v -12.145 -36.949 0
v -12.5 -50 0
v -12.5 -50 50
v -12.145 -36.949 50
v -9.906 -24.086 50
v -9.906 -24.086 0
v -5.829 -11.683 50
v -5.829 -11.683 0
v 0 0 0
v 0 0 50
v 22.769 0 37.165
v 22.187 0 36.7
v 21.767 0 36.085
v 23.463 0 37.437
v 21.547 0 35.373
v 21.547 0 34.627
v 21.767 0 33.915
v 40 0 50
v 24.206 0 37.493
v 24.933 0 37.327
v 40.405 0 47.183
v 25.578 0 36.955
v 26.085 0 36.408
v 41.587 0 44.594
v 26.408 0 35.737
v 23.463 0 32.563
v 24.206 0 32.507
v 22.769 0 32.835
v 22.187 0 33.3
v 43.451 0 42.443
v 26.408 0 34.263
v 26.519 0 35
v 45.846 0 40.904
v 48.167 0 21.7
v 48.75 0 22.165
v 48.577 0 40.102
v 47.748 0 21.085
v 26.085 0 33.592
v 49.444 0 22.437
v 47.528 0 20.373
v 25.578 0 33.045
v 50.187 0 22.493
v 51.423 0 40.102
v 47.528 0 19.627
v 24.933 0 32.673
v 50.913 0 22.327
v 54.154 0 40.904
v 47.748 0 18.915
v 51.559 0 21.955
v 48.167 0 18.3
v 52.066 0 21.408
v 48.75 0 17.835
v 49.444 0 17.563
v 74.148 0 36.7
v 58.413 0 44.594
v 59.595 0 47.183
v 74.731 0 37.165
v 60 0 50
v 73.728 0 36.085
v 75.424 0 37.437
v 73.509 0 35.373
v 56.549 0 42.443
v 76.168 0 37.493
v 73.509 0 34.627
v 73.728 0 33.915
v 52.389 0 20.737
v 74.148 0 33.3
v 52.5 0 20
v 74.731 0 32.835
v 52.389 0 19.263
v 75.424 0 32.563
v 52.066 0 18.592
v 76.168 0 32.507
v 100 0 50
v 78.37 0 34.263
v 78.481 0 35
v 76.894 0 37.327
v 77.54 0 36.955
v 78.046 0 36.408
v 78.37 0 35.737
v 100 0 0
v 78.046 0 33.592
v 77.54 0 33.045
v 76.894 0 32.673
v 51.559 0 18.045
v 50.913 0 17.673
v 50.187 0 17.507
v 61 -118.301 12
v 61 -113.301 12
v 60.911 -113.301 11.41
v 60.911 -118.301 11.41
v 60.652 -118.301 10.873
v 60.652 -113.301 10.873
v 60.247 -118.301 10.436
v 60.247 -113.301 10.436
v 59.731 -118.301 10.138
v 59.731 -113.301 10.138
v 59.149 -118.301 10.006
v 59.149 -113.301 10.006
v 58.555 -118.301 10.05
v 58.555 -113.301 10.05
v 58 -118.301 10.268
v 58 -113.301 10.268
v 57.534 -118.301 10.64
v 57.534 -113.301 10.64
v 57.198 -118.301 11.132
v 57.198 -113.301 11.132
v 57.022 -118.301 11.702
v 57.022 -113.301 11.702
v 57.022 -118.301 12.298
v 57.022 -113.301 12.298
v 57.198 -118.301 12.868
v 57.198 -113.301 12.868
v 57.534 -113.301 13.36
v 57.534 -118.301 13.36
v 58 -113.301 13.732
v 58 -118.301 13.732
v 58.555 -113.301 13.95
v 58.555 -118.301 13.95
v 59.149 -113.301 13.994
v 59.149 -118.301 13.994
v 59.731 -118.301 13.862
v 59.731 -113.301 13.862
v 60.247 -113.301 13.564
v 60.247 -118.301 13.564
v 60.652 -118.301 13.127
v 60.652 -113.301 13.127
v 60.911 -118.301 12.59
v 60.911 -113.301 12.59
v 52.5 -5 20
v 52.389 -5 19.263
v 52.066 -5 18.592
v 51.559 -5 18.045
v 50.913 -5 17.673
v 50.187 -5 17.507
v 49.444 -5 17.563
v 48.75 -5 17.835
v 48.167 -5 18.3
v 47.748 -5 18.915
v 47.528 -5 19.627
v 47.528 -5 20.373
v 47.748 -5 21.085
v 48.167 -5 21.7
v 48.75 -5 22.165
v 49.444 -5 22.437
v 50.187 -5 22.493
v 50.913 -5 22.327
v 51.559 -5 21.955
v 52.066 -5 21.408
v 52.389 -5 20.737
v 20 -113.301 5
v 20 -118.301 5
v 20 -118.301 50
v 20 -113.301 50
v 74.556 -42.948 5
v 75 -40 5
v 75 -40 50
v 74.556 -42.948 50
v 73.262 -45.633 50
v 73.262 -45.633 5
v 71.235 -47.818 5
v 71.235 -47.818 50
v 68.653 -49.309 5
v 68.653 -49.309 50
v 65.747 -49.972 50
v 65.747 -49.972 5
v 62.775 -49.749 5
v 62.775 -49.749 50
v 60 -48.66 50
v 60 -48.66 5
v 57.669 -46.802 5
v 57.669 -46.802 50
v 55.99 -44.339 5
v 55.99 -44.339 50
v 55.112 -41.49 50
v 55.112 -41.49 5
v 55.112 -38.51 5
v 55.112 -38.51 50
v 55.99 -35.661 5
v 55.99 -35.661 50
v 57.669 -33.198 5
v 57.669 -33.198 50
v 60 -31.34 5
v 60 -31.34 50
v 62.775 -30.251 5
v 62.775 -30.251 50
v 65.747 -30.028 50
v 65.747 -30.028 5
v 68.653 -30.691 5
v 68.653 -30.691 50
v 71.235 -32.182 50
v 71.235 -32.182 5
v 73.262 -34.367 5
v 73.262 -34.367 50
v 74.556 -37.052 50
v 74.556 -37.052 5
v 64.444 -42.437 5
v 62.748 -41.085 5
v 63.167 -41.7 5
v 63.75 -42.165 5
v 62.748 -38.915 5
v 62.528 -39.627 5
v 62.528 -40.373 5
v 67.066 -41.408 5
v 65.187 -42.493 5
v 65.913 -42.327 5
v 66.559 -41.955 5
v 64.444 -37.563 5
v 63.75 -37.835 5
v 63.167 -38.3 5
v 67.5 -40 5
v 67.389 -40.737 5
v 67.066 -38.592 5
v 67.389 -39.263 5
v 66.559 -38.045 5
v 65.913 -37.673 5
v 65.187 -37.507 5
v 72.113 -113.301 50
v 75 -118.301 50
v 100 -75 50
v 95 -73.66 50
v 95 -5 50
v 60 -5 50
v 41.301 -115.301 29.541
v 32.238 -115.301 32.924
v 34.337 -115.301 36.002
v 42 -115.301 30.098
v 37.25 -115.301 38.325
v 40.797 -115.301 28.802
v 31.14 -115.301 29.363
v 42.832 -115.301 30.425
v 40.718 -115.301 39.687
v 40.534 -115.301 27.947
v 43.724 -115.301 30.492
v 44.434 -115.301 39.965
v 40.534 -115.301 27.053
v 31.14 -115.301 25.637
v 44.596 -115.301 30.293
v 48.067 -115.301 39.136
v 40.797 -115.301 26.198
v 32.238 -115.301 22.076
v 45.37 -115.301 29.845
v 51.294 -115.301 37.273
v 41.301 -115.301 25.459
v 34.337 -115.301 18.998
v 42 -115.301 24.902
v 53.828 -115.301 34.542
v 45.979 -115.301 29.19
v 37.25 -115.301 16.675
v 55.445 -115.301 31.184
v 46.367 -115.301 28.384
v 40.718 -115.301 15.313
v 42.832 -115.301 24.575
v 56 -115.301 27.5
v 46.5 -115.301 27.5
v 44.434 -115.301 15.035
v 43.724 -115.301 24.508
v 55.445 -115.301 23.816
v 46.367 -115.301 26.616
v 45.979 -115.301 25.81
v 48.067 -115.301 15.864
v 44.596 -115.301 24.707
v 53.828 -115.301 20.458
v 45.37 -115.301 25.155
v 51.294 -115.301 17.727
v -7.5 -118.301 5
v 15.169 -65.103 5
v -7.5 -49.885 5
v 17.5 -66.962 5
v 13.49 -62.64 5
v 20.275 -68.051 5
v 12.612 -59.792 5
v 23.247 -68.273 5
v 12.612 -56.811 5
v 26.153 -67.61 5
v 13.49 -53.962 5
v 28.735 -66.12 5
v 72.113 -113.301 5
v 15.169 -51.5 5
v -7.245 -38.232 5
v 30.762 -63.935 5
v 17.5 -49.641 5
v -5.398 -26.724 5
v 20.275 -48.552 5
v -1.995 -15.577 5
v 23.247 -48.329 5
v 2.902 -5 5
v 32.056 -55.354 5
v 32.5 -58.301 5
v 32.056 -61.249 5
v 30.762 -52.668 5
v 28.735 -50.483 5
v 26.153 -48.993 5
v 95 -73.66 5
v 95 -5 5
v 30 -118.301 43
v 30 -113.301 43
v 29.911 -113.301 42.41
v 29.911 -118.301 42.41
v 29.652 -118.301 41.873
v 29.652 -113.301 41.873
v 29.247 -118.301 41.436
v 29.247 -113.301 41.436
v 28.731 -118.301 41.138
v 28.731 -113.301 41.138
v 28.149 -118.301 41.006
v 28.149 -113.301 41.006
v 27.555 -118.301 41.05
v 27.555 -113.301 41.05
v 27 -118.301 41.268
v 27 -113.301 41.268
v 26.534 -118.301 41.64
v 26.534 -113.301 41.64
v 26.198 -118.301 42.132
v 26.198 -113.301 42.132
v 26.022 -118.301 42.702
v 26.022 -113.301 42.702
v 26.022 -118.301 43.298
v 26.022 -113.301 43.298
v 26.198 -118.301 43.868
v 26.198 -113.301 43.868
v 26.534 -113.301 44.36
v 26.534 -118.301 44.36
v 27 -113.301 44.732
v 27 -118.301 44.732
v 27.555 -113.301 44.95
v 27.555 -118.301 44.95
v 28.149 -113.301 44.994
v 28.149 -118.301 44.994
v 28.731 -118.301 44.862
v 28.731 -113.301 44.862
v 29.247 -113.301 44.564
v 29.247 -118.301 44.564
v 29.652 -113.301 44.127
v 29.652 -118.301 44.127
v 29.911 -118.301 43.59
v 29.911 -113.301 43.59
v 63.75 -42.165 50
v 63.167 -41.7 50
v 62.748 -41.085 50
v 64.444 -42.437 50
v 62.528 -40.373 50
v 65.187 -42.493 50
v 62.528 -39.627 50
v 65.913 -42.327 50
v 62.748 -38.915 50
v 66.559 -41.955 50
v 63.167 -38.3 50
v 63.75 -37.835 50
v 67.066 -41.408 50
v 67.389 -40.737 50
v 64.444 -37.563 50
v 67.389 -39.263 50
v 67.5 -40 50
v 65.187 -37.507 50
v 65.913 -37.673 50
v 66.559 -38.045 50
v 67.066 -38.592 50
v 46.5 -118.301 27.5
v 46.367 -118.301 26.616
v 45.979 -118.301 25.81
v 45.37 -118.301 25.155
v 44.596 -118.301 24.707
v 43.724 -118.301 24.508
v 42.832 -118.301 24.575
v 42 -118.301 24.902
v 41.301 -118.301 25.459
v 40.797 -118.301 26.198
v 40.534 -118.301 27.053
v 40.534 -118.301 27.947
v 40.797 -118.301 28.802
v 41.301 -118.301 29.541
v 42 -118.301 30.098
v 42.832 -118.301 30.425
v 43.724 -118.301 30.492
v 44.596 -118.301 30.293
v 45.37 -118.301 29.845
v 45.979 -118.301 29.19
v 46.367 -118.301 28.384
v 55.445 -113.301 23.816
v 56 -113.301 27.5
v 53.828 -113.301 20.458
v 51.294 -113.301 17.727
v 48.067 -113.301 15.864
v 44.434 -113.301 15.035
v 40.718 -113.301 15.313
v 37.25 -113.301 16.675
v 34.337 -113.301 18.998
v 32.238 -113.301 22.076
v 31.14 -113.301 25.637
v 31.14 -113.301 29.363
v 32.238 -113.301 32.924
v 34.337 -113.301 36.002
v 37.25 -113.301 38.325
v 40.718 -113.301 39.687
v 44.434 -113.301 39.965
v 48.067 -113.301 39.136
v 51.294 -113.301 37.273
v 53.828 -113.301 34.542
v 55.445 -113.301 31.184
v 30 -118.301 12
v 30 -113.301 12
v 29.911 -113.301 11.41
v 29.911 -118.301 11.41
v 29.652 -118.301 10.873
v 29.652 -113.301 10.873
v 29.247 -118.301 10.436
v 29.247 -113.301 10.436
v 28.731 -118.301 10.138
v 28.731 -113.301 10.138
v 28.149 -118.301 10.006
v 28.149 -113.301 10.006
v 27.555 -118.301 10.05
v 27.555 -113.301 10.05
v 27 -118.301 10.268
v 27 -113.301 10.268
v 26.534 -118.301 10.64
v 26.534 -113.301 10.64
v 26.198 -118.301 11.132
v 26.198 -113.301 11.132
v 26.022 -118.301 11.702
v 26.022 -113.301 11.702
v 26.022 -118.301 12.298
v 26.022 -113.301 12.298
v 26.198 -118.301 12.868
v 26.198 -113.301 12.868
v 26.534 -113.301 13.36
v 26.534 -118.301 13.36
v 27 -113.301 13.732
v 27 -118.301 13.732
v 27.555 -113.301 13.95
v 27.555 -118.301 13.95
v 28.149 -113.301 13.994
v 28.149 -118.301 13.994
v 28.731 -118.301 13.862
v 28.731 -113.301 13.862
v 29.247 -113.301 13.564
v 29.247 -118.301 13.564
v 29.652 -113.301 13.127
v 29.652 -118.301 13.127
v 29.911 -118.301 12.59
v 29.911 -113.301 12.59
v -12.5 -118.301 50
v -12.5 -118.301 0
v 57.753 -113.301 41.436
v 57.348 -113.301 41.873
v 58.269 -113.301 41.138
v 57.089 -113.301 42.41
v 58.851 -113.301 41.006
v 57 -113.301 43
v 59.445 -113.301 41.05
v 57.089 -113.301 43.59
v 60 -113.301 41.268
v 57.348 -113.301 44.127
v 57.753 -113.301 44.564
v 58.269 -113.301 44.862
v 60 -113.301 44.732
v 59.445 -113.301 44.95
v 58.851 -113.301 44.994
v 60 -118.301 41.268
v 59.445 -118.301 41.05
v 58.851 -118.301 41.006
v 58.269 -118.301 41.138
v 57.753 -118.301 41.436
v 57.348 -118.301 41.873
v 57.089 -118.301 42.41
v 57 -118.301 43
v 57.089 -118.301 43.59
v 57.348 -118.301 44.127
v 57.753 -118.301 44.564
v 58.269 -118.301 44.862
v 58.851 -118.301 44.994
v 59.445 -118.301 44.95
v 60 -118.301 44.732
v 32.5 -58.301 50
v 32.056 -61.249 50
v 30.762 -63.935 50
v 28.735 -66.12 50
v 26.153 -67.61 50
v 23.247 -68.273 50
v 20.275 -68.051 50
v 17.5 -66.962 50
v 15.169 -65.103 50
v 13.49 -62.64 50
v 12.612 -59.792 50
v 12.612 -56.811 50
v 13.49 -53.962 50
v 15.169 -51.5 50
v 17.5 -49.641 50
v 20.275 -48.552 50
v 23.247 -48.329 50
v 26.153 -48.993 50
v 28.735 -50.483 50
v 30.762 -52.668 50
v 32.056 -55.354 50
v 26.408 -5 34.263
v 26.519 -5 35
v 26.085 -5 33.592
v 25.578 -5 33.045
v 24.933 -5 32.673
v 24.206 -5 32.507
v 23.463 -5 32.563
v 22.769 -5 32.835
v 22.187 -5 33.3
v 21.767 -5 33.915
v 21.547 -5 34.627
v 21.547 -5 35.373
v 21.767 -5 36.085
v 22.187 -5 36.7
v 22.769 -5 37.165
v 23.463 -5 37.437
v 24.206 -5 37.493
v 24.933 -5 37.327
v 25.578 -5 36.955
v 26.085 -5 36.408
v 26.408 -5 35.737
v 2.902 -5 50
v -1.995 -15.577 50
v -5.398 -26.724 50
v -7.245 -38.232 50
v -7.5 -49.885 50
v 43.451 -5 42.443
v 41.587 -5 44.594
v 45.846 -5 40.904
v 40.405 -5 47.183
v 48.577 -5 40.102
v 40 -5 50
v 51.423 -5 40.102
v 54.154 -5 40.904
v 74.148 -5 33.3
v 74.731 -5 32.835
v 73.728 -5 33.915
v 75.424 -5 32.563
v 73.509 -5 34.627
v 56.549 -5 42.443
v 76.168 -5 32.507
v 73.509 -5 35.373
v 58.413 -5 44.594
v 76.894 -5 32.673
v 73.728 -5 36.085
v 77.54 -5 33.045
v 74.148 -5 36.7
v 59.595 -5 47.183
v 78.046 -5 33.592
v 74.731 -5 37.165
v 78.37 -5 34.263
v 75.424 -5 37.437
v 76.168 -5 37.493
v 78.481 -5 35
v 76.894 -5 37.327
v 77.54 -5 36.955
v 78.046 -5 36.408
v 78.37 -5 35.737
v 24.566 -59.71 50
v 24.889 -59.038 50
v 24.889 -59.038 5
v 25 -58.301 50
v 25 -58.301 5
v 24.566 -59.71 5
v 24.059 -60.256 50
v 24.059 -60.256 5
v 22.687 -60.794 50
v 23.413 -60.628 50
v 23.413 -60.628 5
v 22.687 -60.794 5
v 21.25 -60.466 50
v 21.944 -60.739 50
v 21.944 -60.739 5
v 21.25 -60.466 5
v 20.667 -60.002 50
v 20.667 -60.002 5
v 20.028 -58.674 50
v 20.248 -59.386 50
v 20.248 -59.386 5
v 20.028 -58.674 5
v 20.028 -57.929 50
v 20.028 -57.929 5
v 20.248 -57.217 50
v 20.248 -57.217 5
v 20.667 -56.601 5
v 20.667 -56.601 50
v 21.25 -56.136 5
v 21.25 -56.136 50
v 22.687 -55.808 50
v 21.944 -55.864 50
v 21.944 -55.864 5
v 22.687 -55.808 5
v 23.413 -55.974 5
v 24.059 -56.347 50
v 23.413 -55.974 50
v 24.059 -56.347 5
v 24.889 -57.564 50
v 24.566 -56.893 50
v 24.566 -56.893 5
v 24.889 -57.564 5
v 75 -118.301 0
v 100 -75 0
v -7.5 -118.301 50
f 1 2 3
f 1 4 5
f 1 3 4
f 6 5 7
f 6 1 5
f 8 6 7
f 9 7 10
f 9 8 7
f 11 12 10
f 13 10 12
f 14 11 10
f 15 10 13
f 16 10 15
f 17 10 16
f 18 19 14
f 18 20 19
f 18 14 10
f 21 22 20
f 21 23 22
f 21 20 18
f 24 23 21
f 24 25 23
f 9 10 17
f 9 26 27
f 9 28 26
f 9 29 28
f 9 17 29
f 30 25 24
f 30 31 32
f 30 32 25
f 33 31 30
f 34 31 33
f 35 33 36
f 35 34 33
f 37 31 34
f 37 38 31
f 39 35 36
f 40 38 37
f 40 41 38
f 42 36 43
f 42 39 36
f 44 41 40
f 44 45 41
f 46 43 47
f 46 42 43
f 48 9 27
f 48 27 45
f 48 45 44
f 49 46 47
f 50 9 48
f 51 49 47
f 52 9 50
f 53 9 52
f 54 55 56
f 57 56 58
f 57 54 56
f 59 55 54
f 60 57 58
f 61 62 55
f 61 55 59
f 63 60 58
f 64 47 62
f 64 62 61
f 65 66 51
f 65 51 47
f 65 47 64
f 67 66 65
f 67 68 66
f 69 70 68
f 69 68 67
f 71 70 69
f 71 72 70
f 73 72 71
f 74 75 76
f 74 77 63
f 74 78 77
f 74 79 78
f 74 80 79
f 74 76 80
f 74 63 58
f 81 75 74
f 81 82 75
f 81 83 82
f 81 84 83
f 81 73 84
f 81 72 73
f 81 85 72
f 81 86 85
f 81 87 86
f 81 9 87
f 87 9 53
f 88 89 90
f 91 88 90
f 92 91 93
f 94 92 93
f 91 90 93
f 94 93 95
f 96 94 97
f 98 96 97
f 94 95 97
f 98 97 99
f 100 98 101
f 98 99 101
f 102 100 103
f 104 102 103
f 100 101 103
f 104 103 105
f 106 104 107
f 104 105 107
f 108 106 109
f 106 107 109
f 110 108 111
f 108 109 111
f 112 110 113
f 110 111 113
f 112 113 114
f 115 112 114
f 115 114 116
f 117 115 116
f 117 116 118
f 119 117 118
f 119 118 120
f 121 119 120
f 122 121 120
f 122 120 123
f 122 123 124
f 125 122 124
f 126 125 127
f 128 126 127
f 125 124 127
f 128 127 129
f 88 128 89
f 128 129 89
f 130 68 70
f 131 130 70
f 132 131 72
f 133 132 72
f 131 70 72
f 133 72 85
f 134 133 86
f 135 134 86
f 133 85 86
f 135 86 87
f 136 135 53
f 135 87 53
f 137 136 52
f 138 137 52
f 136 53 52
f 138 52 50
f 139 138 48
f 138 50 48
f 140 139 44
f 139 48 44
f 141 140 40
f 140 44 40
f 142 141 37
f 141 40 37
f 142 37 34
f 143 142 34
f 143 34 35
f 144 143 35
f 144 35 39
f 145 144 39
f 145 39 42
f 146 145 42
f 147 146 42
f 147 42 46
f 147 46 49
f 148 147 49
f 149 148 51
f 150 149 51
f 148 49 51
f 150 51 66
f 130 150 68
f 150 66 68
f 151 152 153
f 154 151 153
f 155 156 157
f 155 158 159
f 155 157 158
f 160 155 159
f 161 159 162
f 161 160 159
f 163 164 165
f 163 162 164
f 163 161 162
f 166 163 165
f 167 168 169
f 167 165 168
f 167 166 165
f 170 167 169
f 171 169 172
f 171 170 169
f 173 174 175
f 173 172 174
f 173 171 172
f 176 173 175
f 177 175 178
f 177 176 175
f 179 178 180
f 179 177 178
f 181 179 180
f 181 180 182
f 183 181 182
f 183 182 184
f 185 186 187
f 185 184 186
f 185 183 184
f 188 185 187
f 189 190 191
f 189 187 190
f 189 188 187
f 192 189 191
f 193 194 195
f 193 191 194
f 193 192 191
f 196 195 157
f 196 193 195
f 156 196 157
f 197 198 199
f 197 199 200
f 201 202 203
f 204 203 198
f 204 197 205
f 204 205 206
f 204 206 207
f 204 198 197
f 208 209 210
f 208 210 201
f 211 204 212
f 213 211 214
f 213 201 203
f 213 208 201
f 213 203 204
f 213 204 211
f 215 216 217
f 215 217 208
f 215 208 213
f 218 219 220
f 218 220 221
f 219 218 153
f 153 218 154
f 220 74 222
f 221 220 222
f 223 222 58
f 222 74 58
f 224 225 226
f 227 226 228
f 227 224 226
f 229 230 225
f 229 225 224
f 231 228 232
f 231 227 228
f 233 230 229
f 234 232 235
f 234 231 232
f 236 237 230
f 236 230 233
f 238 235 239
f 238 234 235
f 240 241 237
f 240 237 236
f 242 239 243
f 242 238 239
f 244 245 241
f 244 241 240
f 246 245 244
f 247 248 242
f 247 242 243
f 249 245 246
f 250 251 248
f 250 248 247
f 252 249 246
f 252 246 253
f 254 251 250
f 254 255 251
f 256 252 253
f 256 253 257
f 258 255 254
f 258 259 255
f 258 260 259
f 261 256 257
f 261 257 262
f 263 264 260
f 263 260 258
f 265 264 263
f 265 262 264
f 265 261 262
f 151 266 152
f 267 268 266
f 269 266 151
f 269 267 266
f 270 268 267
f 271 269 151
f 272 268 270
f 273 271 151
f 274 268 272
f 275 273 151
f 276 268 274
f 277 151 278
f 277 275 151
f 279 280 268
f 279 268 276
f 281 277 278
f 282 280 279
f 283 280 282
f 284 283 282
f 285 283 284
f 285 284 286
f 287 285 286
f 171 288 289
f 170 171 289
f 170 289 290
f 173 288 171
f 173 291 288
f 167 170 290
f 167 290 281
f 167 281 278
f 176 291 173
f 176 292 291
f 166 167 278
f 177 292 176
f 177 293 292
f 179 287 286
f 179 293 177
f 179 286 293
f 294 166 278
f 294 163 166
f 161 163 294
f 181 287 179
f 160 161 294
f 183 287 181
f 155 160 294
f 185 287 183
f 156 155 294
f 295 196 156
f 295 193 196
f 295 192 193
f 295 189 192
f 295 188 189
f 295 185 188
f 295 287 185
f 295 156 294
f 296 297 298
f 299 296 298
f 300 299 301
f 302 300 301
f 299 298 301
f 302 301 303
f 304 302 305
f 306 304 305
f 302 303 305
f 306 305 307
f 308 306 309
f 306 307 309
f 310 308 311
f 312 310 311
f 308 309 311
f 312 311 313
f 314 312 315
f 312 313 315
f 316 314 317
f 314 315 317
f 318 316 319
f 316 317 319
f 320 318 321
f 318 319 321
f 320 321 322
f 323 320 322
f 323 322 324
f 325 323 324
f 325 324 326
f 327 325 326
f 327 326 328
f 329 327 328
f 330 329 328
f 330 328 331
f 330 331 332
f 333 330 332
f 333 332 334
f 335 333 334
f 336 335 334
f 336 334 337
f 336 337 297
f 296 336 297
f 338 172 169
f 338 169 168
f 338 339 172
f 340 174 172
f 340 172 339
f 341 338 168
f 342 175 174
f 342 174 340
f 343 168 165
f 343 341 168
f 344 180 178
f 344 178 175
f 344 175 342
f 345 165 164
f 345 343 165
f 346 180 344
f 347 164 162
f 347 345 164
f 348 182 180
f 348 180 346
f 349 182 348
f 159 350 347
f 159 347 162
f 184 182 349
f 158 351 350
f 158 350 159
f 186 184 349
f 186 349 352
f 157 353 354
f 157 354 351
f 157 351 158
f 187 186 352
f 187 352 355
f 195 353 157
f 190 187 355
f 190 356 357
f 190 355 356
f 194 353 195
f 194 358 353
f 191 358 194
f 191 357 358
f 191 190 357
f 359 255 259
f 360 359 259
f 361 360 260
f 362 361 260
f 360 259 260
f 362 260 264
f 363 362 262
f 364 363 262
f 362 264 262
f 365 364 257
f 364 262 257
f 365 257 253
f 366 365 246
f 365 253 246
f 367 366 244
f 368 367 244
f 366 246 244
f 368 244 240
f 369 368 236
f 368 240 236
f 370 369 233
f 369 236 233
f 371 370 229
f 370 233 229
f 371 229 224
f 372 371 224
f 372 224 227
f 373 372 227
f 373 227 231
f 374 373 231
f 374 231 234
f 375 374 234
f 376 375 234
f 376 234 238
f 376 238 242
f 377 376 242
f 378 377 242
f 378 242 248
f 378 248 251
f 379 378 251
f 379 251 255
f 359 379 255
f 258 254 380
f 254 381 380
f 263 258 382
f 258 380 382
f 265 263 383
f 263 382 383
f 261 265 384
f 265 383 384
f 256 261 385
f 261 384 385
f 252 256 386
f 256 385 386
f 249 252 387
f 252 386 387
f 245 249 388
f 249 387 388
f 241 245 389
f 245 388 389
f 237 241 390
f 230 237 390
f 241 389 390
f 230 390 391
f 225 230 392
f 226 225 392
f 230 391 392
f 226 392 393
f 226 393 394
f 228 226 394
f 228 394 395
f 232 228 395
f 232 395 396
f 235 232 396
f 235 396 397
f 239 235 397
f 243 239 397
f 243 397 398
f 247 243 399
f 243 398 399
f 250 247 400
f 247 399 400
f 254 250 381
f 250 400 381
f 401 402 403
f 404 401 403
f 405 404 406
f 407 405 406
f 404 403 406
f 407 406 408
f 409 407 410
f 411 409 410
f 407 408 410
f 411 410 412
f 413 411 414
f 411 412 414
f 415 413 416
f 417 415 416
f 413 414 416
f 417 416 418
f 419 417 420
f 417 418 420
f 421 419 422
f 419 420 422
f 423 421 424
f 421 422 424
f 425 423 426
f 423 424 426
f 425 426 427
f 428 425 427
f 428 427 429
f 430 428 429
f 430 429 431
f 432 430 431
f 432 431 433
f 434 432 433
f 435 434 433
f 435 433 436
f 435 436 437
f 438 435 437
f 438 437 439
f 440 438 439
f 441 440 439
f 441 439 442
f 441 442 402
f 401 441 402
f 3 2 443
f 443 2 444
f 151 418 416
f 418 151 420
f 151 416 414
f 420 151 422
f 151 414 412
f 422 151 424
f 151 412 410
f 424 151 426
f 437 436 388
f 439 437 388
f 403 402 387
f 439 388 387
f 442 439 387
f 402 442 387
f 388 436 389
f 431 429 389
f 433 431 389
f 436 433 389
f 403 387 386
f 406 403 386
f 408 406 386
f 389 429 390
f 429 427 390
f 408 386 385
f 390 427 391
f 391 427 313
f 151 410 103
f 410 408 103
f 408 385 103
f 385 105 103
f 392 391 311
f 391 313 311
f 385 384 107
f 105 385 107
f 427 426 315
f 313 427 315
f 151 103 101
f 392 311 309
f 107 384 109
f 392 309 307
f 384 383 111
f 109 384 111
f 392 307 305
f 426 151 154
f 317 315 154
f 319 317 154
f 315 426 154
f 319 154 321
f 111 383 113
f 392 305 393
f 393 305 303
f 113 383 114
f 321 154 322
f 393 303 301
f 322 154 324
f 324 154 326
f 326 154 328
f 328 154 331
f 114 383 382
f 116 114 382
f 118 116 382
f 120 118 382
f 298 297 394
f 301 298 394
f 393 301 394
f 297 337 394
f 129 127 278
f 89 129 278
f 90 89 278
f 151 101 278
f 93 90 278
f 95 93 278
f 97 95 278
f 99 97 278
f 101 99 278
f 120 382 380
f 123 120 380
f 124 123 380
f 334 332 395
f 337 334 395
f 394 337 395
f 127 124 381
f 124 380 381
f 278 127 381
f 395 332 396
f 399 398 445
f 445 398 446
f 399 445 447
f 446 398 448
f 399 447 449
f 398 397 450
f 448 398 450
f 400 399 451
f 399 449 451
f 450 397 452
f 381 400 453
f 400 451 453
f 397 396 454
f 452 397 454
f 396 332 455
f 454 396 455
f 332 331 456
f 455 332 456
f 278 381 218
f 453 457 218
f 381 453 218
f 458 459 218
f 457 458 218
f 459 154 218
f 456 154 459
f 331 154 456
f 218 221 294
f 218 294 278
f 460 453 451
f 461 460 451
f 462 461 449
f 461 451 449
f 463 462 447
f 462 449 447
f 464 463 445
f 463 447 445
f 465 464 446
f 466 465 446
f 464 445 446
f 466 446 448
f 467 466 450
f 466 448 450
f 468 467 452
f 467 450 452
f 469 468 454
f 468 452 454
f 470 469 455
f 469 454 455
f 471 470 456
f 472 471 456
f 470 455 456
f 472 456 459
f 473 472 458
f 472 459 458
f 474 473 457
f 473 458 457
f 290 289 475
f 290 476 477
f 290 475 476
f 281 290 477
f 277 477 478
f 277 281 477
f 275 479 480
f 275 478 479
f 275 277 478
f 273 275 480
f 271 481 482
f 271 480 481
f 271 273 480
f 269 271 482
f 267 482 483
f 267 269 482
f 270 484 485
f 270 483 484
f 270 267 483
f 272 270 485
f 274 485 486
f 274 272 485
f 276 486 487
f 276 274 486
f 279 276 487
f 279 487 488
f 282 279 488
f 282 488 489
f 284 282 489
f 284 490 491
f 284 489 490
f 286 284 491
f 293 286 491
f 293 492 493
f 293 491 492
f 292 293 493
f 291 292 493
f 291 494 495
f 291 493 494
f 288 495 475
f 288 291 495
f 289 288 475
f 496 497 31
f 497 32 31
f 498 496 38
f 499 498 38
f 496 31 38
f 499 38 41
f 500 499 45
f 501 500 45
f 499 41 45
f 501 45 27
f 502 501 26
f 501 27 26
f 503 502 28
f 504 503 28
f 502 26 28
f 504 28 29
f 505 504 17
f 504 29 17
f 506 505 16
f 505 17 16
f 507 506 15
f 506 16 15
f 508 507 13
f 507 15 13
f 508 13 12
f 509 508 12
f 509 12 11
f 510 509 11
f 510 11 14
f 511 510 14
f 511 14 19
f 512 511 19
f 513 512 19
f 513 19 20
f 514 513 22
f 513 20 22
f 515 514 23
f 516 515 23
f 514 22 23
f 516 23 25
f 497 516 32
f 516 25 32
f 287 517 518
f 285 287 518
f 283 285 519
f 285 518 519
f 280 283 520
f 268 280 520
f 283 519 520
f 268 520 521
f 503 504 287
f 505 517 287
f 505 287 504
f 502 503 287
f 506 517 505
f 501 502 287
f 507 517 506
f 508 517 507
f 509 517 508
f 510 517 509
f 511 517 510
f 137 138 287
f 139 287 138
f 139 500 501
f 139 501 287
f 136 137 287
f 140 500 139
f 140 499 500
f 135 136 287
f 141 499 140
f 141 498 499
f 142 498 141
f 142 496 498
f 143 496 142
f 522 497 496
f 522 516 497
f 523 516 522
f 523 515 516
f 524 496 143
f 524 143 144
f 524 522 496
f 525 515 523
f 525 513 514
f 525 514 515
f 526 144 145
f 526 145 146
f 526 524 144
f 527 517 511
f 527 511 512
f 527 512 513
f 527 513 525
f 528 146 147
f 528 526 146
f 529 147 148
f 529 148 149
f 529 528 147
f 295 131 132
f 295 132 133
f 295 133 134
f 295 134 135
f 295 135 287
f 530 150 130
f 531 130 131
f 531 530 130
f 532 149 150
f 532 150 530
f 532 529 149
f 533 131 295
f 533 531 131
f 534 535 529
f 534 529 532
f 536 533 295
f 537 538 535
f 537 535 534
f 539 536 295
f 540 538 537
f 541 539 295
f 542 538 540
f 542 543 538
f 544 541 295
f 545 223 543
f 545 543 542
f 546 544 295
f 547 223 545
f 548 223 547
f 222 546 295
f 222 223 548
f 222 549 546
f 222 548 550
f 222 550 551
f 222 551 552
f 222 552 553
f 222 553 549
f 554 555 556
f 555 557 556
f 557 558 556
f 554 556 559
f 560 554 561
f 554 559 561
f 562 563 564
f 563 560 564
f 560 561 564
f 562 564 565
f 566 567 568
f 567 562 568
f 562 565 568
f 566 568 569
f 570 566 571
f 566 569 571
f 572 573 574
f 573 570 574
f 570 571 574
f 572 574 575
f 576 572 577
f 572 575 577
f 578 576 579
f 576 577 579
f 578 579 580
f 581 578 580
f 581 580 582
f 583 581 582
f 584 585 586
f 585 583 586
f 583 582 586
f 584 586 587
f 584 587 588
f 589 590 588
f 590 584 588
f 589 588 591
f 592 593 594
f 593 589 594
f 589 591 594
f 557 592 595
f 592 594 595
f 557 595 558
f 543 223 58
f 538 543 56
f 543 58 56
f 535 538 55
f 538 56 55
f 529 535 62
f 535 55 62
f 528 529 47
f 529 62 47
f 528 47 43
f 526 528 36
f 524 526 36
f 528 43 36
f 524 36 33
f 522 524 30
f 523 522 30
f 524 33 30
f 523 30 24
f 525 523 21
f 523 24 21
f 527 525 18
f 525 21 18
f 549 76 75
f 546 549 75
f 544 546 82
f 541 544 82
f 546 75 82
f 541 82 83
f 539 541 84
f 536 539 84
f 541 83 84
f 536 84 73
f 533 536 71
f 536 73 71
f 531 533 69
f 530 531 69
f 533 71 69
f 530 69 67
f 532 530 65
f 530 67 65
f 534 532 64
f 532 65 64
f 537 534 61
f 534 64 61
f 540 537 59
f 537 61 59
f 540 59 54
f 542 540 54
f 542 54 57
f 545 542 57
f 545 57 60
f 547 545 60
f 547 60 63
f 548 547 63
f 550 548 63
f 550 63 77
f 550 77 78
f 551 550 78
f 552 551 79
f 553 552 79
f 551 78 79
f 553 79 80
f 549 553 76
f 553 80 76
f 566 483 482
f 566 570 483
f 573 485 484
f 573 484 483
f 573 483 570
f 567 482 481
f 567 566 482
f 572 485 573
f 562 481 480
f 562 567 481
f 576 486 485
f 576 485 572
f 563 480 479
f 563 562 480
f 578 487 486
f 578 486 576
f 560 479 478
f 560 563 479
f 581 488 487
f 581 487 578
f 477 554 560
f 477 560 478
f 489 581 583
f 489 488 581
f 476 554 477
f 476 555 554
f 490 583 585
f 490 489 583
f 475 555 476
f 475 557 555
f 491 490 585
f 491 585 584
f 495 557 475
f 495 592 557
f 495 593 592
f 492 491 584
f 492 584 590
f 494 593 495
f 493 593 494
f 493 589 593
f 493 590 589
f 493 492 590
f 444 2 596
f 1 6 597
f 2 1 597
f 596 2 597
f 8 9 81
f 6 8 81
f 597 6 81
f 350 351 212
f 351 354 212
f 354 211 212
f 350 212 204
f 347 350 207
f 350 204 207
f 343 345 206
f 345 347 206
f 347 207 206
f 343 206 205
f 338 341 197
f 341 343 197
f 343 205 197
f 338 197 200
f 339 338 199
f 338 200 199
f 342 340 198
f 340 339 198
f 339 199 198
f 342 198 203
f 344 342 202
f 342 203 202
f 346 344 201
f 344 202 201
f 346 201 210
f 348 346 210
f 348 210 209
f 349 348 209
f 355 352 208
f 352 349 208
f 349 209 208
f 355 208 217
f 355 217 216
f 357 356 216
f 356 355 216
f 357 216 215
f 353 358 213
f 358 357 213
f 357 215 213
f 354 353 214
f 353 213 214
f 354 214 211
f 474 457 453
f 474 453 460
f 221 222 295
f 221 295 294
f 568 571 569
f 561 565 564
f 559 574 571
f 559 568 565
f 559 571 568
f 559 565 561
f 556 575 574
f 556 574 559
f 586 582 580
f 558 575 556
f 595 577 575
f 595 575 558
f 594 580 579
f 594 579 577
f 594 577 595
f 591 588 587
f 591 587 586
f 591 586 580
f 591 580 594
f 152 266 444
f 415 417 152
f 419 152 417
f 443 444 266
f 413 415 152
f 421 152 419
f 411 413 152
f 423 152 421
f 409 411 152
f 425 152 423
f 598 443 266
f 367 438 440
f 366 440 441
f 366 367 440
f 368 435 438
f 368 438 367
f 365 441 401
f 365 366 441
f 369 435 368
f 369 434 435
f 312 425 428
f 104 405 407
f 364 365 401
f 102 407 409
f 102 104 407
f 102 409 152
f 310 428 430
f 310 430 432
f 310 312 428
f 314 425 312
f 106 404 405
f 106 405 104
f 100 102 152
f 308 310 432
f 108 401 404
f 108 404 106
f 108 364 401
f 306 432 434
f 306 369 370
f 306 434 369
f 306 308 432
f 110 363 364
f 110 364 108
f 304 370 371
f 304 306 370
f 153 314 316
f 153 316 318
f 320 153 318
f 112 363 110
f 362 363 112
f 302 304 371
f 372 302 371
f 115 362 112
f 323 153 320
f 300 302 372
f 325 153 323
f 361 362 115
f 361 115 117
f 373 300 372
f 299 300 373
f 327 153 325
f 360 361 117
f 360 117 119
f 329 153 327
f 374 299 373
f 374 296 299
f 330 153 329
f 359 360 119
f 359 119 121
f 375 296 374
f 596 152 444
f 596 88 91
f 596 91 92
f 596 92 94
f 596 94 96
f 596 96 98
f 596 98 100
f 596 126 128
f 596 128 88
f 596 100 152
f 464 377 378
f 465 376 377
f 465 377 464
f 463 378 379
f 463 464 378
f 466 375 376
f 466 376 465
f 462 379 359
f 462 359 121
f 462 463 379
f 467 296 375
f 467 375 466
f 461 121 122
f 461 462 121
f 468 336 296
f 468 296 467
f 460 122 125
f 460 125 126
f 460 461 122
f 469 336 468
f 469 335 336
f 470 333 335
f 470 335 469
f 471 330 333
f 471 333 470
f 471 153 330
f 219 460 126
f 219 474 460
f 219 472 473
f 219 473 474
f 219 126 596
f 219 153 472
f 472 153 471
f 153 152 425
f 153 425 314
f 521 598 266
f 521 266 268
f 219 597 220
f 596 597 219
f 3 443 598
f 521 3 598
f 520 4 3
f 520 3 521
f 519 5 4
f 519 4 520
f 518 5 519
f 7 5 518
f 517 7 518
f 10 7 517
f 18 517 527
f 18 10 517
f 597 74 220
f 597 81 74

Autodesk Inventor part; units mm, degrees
ref_plane "YZ Plane" through (0, 0, 0) normal (1, 0, 0) x (0, 1, 0)
ref_plane "XZ Plane" through (0, 0, 0) normal (0, 1, 0) x (-1, 0, 0)
ref_plane "XY Plane" through (0, 0, 0) normal (0, 0, 1) x (1, 0, 0)
sketch "Sketch1" plane through (0, 0, 0) normal (0, 0, 1) x (1, 0, 0)
  line L0 (0, 0) -> (100, 0)
  line L1 (100, 0) -> (100, -75)
  line L2 (100, -75) -> (75, -118.3013)
  line L3 (-12.5, -50) -> (-12.5, -118.3013)
  arc A0 (0, 0) -> (-12.5, -50) centre (77.4072, -45.9143) ccw
  line L4 (-12.5, -118.3013) -> (75, -118.3013)
  dimension "d0" = 100
  dimension "d1" = 75
  dimension "d2" = 50
  dimension "d3" = 150
  dimension "d4" = 12.5
  dimension "d5" = 50
  dimension "d6" = 90
extrude "Extrusion1" add sketch "Sketch1" along normal blind 50
sketch "Sketch2" plane through (0, 0, 50) normal (0, 0, 1) x (1, 0, 0)
  line L0 (100, 0) -> (0, 0) projected
  arc A0 (0, 0) -> (-12.5, -50) centre (77.4072, -45.9143) ccw projected
  line L1 (-12.5, -50) -> (-12.5, -118.3013) projected
  line L2 (-12.5, -118.3013) -> (75, -118.3013) projected
  line L3 (75, -118.3013) -> (100, -75) projected
  line L4 (100, -75) -> (100, 0) projected
  arc A1 (2.902, -5) -> (-7.5, -49.8848) centre (77.4072, -45.9143) ccw
  line L5 (2.902, -5) -> (95, -5)
  line L6 (95, -5) -> (95, -73.6603)
  line L7 (95, -73.6603) -> (72.1132, -113.3013)
  line L8 (72.1132, -113.3013) -> (-7.5, -113.3013)
  line L9 (-7.5, -113.3013) -> (-7.5, -49.8848)
  dimension "d9" = 5
extrude "Extrusion2" cut sketch "Sketch2" against normal blind 45 contours L5 L6 L7 L8 L9 A1
sketch "Sketch3" plane through (0, 0, 50) normal (0, 0, 1) x (1, 0, 0)
  line L0 (72.1132, -113.3013) -> (-7.5, -113.3013) projected
  line L1 (-12.5, -118.3013) -> (75, -118.3013) projected
  line L2 (-7.5, -113.3013) -> (60, -113.3013)
  line L3 (60, -113.3013) -> (60, -118.3013)
  line L4 (60, -118.3013) -> (-7.5, -118.3013)
  line L5 (-7.5, -118.3013) -> (-7.5, -113.3013)
  point P0 (0, 0)
  dimension "d13" = 15
extrude "Extrusion3" cut sketch "Sketch3" against normal blind 45
sketch "Sketch4" plane through (0, 0, 0) normal (0, 1, 0) x (1, 0, 0)
  circle A0 centre (50, -50) radius 10
  line L0 (100, -50) -> (0, -50) projected
  point P0 (0, 0)
  dimension "d16" = 20
extrude "Extrusion4" cut sketch "Sketch4" against normal through all
sketch "Sketch5" plane through (0, 0, 0) normal (0, 1, 0) x (1, 0, 0)
  arc A0 (60, -50) -> (40, -50) centre (50, -50) ccw projected
  circle A1 centre (50, -50) radius 30 construction
  circle A2 centre (50, -20) radius 2.5
  circle A3 centre (24.0192, -35) radius 2.5
  circle A4 centre (24.0192, -65) radius 2.5
  circle A5 centre (50, -80) radius 2.5
  circle A6 centre (75.9808, -65) radius 2.5
  circle A7 centre (75.9808, -35) radius 2.5
  point P0 (0, 0)
  dimension "d20" = 60
  dimension "d21" = 5
  dimension "d24" = 360
extrude "Extrusion5" cut sketch "Sketch5" against normal blind 5 contours A2 | A3 | A7
sketch "Sketch17" plane through (-12.5, -118.3013, 0) normal (0, -1, 0) x (1, 0, 0)
  line L0 (72.5, 5) -> (32.5, 5)
  line L1 (32.5, 5) -> (32.5, 15)
  line L2 (32.5, 15) -> (72.5, 15)
  line L3 (72.5, 15) -> (72.5, 5)
  point P0 (12.5, 0)
  dimension "d68" = 40
  dimension "d69" = 10
extrude "Extrusion16" add sketch "Sketch17" against normal blind 5
sketch "Sketch18" plane through (0, 0, 5) normal (0, 0, 1) x (1, 0, 0)
  circle A0 centre (65, -40) radius 10
  circle A1 centre (65, -40) radius 2.5
  line L0 (100, 0) -> (0, 0) projected
  line L1 (100, -75) -> (100, 0) projected
  circle A2 centre (22.5, -58.3013) radius 10
  circle A3 centre (22.5, -58.3013) radius 2.5
  line L2 (-12.5, -50) -> (-12.5, -118.3013) projected
  line L3 (20, -118.3013) -> (60, -118.3013) projected
  point P0 (57.5, 0)
  dimension "d72" = 20
  dimension "d73" = 5
  dimension "d74" = 40
  dimension "d75" = 35
  dimension "d76" = 20
  dimension "d77" = 5
  dimension "d78" = 35
  dimension "d79" = 60
extrude "Extrusion17" add sketch "Sketch18" along normal blind 45
sketch "Sketch19" plane through (72.1132, -113.3013, 50) normal (0, 1, 0) x (1, 0, 0)
  line L0 (-52.1132, 45) -> (-5.1132, 45)
  line L1 (-5.1132, 45) -> (-5.1132, 0)
  line L2 (-5.1132, 0) -> (-52.1132, 0)
  line L3 (-52.1132, 0) -> (-52.1132, 45)
  line L4 (-13.1132, 38) -> (-44.1132, 38) construction
  line L5 (-44.1132, 38) -> (-44.1132, 7) construction
  line L6 (-44.1132, 7) -> (-13.1132, 7) construction
  line L7 (-13.1132, 7) -> (-13.1132, 38) construction
  circle A0 centre (-13.1132, 38) radius 2
  circle A1 centre (-13.1132, 7) radius 2
  circle A2 centre (-44.1132, 7) radius 2
  circle A3 centre (-44.1132, 38) radius 2
  circle A4 centre (-28.6132, 22.5) radius 3
  line L8 (-12.1132, 0) -> (-12.1132, 35) projected
  point P0 (-72.1132, 50)
  point P1 (-28.6132, 7)
  point P2 (-28.6132, 0)
  point P3 (-5.1132, 22.5)
  point P4 (-13.1132, 22.5)
  dimension "d82" = 31
  dimension "d83" = 31
  dimension "d84" = 4
  dimension "d85" = 4
  dimension "d86" = 4
  dimension "d87" = 4
  dimension "d88" = 6
  dimension "d96" = 7
extrude "Extrusion18" add sketch "Sketch19" against normal blind 5
extrude "Extrusion19" cut sketch "Sketch19" against normal blind 5 contours A0 | A3
sketch "Sketch20" plane through (72.1132, -113.3013, 50) normal (0, 1, 0) x (1, 0, 0)
  circle A0 centre (-28.6132, 22.5) radius 3 projected
  circle A1 centre (-28.6132, 22.5) radius 12.5
  point P0 (-72.1132, 50)
  dimension "d93" = 25
extrude "Extrusion20" cut sketch "Sketch20" against normal blind 2
properties part number "FA001" material "ABS Plastic"
